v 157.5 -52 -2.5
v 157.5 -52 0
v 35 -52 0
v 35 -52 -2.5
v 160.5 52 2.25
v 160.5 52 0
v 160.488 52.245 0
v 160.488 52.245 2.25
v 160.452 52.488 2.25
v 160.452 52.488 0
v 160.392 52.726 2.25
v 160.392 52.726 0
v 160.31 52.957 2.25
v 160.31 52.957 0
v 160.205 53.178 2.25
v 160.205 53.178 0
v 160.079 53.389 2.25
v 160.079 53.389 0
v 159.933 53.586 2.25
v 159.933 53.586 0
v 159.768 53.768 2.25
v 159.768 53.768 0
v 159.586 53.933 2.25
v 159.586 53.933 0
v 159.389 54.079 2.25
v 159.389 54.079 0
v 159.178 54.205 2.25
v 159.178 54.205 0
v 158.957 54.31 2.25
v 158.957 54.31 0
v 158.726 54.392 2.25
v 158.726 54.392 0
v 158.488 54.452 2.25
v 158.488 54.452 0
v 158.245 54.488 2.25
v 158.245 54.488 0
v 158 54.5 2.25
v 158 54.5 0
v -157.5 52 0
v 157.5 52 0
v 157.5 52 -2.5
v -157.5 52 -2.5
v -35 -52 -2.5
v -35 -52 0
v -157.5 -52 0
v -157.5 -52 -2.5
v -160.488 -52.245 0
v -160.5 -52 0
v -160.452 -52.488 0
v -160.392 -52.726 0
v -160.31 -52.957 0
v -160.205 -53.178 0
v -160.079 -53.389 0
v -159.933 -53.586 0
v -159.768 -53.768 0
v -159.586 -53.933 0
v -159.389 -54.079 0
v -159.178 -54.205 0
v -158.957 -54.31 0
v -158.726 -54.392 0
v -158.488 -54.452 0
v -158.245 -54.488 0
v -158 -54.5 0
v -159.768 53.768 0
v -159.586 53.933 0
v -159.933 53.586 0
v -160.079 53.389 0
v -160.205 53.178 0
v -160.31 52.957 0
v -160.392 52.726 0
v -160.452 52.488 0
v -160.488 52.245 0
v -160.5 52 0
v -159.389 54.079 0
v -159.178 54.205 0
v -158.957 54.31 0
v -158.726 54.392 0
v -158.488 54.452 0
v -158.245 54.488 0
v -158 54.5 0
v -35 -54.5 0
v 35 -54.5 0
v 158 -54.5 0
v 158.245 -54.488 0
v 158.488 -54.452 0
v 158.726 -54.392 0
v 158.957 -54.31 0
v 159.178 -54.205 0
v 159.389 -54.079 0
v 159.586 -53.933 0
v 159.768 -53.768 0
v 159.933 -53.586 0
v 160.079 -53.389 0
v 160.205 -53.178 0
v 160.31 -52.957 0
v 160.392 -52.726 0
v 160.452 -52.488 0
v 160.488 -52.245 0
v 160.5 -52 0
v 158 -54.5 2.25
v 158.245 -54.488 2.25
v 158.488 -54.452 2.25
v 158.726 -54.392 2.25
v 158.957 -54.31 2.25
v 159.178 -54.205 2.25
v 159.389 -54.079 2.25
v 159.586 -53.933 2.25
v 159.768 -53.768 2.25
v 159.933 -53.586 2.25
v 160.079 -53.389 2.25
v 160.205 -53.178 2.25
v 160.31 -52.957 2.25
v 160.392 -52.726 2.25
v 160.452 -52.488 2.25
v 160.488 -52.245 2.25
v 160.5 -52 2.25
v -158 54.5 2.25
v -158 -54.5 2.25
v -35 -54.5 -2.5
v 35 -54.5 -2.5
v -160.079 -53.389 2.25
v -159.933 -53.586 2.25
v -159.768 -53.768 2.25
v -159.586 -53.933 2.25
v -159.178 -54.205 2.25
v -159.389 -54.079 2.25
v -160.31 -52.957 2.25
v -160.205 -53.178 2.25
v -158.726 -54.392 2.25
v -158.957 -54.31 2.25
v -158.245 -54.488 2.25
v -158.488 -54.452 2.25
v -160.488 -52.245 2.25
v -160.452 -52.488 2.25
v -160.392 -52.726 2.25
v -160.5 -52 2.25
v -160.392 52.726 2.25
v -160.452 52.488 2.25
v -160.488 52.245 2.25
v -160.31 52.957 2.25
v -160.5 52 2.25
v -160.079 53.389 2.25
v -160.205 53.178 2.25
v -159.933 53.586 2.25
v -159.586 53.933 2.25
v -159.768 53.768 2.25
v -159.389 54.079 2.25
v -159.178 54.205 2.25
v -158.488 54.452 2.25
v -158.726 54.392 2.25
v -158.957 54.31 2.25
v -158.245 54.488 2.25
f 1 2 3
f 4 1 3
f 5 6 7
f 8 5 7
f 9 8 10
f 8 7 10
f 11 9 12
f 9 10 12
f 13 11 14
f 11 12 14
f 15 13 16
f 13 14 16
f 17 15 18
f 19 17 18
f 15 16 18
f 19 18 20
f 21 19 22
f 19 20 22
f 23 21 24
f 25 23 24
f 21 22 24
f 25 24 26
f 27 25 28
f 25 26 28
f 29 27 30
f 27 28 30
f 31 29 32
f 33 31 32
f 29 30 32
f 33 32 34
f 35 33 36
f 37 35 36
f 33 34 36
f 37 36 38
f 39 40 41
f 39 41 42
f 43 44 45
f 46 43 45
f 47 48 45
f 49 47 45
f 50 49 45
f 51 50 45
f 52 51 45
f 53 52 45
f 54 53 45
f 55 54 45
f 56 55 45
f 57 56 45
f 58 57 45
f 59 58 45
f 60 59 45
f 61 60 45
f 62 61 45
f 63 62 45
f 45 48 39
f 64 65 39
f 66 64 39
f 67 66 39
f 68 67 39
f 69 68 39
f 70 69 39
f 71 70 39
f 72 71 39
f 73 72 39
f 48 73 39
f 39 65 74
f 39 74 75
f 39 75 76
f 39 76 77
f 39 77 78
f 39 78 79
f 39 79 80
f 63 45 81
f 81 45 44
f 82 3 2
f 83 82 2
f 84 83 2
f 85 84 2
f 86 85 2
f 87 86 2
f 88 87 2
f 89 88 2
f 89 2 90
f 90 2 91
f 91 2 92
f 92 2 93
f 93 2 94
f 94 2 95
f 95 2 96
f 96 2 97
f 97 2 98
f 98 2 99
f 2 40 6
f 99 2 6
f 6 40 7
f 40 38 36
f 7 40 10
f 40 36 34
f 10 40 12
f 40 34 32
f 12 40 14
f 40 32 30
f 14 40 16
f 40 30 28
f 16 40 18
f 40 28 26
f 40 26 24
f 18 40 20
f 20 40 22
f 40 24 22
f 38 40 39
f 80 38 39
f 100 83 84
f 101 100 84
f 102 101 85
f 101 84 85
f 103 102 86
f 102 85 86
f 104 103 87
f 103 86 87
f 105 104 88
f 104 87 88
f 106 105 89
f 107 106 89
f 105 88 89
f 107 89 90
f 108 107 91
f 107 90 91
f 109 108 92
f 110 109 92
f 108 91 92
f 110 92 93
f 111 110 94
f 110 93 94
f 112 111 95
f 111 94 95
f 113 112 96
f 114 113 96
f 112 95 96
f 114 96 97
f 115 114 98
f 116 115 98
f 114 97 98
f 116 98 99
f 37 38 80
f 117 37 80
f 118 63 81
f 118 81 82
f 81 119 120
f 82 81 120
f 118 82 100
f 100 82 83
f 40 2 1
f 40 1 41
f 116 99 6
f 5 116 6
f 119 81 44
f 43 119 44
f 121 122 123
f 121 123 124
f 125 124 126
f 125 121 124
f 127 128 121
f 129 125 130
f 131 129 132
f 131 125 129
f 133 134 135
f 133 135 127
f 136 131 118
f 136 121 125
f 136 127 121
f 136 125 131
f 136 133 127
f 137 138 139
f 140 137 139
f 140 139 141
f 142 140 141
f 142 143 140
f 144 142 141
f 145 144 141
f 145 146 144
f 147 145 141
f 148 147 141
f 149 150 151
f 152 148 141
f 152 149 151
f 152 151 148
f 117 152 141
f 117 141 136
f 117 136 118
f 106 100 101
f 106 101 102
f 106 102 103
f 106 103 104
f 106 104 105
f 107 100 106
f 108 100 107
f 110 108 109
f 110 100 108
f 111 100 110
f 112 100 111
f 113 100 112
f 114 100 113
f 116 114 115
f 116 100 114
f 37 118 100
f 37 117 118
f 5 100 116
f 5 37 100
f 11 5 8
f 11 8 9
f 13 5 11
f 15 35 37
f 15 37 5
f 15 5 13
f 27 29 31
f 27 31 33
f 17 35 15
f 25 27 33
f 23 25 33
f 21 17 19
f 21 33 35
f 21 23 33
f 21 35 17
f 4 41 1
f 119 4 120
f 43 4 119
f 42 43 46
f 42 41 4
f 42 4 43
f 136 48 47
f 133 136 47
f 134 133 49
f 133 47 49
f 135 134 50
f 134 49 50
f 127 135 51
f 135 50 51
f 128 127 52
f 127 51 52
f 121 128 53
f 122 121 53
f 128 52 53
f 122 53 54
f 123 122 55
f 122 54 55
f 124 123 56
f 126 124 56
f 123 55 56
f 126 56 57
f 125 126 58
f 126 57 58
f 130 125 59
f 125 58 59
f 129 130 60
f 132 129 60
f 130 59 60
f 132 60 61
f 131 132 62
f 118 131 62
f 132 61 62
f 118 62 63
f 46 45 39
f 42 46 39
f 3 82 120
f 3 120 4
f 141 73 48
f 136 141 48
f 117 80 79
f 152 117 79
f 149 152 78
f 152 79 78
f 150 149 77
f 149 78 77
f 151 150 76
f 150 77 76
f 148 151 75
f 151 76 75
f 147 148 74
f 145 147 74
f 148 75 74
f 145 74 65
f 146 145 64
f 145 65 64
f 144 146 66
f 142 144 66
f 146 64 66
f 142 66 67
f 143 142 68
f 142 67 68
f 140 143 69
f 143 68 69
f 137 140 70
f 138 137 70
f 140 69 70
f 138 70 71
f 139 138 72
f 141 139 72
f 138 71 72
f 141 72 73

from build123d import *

# Parameters (mm, degrees)
DIGITIZER_DEPTH                               = 2.25
SKETCH2_W                                     = 315
SKETCH2_H                                     = 104
DISPLAY_INCLUDING_ADHESIVE_MARGIN_OF_5M_DEPTH = 2.5
SKETCH3_W                                     = 70
SKETCH3_H                                     = 2.5
DIGITIZER_CABLE_DEPTH                         = 2.5


with BuildPart() as part:
    # Sketch1 → DIGITIZER (new body)
    with BuildSketch(Plane.XY):
        with BuildLine():
            Line((-158, -54.5), (158, -54.5))
            ThreePointArc((158, -54.5), (159.767766953, -53.767766953), (160.5, -52))
            Line((160.5, -52), (160.5, 52))
            ThreePointArc((160.5, 52), (159.767766953, 53.767766953), (158, 54.5))
            Line((158, 54.5), (-158, 54.5))
            ThreePointArc((-158, 54.5), (-159.767766953, 53.767766953), (-160.5, 52))
            Line((-160.5, 52), (-160.5, -52))
            ThreePointArc((-160.5, -52), (-159.767766953, -53.767766953), (-158, -54.5))
        make_face()
    extrude(amount=DIGITIZER_DEPTH)

    # Sketch2 → DISPLAY INCLUDING ADHESIVE MARGIN OF .5MM (add)
    with BuildSketch(Plane(origin=(0, 0, 0), x_dir=(-1, 0, 0), z_dir=(0, 0, -1))):
        Rectangle(SKETCH2_W, SKETCH2_H)
    extrude(amount=DISPLAY_INCLUDING_ADHESIVE_MARGIN_OF_5M_DEPTH)

    # Sketch3 → DIGITIZER CABLE (add)
    with BuildSketch(Plane(origin=(0, 0, 0), x_dir=(-1, 0, 0), z_dir=(0, 0, -1))):
        with Locations((0, -53.25)):
            Rectangle(SKETCH3_W, SKETCH3_H)
    extrude(amount=DIGITIZER_CABLE_DEPTH)


solid = part.part
